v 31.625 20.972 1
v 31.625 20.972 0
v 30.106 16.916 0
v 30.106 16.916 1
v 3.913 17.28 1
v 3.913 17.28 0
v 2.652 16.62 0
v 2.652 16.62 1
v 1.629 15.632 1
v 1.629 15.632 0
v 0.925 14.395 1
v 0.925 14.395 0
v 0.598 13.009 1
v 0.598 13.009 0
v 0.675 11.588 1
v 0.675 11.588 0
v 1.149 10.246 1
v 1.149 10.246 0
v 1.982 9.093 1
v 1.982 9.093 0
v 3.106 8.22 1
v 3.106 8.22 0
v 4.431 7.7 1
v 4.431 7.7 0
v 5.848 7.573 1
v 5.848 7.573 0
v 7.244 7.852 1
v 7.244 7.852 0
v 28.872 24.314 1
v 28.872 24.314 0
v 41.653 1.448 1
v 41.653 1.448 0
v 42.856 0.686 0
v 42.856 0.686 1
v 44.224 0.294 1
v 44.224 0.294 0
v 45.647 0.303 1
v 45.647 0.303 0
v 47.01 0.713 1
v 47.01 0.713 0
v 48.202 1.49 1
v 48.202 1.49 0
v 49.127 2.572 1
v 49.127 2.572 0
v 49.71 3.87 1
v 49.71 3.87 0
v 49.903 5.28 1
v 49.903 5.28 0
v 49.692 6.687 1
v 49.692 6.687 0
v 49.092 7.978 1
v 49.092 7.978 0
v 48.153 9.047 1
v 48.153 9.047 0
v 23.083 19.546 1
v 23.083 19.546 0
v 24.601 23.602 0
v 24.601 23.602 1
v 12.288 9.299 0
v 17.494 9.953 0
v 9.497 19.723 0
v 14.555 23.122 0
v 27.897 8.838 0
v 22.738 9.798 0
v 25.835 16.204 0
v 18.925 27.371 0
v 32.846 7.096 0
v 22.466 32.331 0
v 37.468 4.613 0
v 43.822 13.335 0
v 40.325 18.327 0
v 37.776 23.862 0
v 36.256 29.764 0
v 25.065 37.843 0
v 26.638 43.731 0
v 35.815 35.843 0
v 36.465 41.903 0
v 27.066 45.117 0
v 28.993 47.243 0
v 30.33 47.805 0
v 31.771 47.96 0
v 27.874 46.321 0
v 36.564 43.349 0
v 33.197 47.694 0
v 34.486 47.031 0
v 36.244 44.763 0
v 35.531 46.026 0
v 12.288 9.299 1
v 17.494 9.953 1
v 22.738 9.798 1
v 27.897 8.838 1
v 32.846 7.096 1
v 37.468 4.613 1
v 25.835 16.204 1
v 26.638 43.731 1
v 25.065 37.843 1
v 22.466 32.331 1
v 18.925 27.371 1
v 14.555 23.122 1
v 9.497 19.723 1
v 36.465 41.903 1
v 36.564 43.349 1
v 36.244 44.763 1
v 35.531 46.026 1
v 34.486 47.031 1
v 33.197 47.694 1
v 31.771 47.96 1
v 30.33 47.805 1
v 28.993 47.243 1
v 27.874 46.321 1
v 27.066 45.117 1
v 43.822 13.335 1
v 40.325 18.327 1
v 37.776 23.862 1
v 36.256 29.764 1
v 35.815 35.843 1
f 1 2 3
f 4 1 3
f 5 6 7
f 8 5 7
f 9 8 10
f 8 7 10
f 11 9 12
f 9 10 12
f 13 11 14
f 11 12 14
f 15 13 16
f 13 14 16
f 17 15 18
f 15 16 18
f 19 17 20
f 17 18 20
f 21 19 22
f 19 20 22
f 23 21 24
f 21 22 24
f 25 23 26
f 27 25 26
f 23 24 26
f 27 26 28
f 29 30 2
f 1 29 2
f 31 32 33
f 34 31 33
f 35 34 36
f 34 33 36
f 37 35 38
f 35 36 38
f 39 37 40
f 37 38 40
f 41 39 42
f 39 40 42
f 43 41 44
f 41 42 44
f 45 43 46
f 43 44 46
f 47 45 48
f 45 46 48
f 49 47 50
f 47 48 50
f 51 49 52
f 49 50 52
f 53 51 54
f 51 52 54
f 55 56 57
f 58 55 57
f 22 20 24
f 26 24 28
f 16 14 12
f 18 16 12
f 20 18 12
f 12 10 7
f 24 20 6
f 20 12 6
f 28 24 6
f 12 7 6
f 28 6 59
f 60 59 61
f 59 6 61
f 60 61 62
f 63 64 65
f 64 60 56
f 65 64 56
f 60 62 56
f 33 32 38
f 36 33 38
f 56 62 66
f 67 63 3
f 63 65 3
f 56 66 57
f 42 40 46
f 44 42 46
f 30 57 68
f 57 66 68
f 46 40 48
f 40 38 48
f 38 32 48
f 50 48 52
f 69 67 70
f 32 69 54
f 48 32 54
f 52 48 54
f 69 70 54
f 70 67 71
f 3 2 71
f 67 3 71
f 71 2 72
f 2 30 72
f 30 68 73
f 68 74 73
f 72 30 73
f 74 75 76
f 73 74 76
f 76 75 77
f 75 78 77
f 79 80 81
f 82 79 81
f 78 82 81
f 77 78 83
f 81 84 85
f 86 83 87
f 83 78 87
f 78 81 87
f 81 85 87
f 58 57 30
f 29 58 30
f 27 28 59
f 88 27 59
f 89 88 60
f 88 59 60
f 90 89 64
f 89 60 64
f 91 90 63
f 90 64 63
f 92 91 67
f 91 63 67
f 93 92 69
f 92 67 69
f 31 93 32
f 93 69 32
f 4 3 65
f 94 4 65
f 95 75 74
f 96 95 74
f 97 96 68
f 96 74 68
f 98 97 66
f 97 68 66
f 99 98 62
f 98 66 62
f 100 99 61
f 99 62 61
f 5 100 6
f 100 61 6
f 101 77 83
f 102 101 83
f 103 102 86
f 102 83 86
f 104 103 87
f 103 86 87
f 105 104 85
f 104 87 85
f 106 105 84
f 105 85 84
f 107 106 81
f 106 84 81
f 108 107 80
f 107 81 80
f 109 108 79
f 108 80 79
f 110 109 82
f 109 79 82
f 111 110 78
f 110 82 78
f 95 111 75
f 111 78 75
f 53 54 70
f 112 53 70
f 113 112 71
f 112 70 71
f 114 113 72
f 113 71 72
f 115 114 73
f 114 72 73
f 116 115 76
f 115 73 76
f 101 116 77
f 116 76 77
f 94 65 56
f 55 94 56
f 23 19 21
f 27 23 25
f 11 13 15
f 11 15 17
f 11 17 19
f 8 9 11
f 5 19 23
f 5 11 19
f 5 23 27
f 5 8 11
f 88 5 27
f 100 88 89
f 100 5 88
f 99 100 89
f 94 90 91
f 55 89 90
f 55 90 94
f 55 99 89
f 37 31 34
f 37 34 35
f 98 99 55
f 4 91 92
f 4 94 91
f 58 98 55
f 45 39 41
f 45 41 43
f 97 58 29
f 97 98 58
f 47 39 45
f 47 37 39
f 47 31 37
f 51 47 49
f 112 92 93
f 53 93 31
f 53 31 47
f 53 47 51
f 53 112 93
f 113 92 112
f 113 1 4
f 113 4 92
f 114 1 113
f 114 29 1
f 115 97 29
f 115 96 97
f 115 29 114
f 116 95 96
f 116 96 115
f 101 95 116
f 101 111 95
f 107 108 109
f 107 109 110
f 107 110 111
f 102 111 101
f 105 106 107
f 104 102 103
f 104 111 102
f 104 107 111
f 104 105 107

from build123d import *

# Parameters (mm, degrees)
F1_DEPTH = 1


with BuildPart() as f1:
    # F0 (on Top) → F1 (new body)
    with BuildSketch(Plane.XY):
        with BuildLine():
            ThreePointArc((7.244152, 7.851622), (25.336024, 9.417542), (41.653382, 1.448117))
            ThreePointArc((41.653382, 1.448117), (48.703058, 1.997731), (48.153443, 9.047407))
            ThreePointArc((48.153443, 9.047407), (37.776237, 23.862356), (36.465034, 41.902585))
            ThreePointArc((36.465034, 41.902585), (32.493609, 47.878818), (26.638178, 43.731348))
            ThreePointArc((26.638178, 43.731348), (18.924994, 27.370544), (3.913004, 17.280485))
            ThreePointArc((3.913004, 17.280485), (0.864147, 10.90048), (7.244152, 7.851622))
        make_face()
        Polygon((28.871957, 24.314205), (31.624682, 20.971675), (30.10633, 16.91648), (25.835252, 16.203815), (23.082526, 19.546344), (24.600879, 23.601539), align=None, mode=Mode.SUBTRACT)
    extrude(amount=F1_DEPTH)


solid = f1.part
